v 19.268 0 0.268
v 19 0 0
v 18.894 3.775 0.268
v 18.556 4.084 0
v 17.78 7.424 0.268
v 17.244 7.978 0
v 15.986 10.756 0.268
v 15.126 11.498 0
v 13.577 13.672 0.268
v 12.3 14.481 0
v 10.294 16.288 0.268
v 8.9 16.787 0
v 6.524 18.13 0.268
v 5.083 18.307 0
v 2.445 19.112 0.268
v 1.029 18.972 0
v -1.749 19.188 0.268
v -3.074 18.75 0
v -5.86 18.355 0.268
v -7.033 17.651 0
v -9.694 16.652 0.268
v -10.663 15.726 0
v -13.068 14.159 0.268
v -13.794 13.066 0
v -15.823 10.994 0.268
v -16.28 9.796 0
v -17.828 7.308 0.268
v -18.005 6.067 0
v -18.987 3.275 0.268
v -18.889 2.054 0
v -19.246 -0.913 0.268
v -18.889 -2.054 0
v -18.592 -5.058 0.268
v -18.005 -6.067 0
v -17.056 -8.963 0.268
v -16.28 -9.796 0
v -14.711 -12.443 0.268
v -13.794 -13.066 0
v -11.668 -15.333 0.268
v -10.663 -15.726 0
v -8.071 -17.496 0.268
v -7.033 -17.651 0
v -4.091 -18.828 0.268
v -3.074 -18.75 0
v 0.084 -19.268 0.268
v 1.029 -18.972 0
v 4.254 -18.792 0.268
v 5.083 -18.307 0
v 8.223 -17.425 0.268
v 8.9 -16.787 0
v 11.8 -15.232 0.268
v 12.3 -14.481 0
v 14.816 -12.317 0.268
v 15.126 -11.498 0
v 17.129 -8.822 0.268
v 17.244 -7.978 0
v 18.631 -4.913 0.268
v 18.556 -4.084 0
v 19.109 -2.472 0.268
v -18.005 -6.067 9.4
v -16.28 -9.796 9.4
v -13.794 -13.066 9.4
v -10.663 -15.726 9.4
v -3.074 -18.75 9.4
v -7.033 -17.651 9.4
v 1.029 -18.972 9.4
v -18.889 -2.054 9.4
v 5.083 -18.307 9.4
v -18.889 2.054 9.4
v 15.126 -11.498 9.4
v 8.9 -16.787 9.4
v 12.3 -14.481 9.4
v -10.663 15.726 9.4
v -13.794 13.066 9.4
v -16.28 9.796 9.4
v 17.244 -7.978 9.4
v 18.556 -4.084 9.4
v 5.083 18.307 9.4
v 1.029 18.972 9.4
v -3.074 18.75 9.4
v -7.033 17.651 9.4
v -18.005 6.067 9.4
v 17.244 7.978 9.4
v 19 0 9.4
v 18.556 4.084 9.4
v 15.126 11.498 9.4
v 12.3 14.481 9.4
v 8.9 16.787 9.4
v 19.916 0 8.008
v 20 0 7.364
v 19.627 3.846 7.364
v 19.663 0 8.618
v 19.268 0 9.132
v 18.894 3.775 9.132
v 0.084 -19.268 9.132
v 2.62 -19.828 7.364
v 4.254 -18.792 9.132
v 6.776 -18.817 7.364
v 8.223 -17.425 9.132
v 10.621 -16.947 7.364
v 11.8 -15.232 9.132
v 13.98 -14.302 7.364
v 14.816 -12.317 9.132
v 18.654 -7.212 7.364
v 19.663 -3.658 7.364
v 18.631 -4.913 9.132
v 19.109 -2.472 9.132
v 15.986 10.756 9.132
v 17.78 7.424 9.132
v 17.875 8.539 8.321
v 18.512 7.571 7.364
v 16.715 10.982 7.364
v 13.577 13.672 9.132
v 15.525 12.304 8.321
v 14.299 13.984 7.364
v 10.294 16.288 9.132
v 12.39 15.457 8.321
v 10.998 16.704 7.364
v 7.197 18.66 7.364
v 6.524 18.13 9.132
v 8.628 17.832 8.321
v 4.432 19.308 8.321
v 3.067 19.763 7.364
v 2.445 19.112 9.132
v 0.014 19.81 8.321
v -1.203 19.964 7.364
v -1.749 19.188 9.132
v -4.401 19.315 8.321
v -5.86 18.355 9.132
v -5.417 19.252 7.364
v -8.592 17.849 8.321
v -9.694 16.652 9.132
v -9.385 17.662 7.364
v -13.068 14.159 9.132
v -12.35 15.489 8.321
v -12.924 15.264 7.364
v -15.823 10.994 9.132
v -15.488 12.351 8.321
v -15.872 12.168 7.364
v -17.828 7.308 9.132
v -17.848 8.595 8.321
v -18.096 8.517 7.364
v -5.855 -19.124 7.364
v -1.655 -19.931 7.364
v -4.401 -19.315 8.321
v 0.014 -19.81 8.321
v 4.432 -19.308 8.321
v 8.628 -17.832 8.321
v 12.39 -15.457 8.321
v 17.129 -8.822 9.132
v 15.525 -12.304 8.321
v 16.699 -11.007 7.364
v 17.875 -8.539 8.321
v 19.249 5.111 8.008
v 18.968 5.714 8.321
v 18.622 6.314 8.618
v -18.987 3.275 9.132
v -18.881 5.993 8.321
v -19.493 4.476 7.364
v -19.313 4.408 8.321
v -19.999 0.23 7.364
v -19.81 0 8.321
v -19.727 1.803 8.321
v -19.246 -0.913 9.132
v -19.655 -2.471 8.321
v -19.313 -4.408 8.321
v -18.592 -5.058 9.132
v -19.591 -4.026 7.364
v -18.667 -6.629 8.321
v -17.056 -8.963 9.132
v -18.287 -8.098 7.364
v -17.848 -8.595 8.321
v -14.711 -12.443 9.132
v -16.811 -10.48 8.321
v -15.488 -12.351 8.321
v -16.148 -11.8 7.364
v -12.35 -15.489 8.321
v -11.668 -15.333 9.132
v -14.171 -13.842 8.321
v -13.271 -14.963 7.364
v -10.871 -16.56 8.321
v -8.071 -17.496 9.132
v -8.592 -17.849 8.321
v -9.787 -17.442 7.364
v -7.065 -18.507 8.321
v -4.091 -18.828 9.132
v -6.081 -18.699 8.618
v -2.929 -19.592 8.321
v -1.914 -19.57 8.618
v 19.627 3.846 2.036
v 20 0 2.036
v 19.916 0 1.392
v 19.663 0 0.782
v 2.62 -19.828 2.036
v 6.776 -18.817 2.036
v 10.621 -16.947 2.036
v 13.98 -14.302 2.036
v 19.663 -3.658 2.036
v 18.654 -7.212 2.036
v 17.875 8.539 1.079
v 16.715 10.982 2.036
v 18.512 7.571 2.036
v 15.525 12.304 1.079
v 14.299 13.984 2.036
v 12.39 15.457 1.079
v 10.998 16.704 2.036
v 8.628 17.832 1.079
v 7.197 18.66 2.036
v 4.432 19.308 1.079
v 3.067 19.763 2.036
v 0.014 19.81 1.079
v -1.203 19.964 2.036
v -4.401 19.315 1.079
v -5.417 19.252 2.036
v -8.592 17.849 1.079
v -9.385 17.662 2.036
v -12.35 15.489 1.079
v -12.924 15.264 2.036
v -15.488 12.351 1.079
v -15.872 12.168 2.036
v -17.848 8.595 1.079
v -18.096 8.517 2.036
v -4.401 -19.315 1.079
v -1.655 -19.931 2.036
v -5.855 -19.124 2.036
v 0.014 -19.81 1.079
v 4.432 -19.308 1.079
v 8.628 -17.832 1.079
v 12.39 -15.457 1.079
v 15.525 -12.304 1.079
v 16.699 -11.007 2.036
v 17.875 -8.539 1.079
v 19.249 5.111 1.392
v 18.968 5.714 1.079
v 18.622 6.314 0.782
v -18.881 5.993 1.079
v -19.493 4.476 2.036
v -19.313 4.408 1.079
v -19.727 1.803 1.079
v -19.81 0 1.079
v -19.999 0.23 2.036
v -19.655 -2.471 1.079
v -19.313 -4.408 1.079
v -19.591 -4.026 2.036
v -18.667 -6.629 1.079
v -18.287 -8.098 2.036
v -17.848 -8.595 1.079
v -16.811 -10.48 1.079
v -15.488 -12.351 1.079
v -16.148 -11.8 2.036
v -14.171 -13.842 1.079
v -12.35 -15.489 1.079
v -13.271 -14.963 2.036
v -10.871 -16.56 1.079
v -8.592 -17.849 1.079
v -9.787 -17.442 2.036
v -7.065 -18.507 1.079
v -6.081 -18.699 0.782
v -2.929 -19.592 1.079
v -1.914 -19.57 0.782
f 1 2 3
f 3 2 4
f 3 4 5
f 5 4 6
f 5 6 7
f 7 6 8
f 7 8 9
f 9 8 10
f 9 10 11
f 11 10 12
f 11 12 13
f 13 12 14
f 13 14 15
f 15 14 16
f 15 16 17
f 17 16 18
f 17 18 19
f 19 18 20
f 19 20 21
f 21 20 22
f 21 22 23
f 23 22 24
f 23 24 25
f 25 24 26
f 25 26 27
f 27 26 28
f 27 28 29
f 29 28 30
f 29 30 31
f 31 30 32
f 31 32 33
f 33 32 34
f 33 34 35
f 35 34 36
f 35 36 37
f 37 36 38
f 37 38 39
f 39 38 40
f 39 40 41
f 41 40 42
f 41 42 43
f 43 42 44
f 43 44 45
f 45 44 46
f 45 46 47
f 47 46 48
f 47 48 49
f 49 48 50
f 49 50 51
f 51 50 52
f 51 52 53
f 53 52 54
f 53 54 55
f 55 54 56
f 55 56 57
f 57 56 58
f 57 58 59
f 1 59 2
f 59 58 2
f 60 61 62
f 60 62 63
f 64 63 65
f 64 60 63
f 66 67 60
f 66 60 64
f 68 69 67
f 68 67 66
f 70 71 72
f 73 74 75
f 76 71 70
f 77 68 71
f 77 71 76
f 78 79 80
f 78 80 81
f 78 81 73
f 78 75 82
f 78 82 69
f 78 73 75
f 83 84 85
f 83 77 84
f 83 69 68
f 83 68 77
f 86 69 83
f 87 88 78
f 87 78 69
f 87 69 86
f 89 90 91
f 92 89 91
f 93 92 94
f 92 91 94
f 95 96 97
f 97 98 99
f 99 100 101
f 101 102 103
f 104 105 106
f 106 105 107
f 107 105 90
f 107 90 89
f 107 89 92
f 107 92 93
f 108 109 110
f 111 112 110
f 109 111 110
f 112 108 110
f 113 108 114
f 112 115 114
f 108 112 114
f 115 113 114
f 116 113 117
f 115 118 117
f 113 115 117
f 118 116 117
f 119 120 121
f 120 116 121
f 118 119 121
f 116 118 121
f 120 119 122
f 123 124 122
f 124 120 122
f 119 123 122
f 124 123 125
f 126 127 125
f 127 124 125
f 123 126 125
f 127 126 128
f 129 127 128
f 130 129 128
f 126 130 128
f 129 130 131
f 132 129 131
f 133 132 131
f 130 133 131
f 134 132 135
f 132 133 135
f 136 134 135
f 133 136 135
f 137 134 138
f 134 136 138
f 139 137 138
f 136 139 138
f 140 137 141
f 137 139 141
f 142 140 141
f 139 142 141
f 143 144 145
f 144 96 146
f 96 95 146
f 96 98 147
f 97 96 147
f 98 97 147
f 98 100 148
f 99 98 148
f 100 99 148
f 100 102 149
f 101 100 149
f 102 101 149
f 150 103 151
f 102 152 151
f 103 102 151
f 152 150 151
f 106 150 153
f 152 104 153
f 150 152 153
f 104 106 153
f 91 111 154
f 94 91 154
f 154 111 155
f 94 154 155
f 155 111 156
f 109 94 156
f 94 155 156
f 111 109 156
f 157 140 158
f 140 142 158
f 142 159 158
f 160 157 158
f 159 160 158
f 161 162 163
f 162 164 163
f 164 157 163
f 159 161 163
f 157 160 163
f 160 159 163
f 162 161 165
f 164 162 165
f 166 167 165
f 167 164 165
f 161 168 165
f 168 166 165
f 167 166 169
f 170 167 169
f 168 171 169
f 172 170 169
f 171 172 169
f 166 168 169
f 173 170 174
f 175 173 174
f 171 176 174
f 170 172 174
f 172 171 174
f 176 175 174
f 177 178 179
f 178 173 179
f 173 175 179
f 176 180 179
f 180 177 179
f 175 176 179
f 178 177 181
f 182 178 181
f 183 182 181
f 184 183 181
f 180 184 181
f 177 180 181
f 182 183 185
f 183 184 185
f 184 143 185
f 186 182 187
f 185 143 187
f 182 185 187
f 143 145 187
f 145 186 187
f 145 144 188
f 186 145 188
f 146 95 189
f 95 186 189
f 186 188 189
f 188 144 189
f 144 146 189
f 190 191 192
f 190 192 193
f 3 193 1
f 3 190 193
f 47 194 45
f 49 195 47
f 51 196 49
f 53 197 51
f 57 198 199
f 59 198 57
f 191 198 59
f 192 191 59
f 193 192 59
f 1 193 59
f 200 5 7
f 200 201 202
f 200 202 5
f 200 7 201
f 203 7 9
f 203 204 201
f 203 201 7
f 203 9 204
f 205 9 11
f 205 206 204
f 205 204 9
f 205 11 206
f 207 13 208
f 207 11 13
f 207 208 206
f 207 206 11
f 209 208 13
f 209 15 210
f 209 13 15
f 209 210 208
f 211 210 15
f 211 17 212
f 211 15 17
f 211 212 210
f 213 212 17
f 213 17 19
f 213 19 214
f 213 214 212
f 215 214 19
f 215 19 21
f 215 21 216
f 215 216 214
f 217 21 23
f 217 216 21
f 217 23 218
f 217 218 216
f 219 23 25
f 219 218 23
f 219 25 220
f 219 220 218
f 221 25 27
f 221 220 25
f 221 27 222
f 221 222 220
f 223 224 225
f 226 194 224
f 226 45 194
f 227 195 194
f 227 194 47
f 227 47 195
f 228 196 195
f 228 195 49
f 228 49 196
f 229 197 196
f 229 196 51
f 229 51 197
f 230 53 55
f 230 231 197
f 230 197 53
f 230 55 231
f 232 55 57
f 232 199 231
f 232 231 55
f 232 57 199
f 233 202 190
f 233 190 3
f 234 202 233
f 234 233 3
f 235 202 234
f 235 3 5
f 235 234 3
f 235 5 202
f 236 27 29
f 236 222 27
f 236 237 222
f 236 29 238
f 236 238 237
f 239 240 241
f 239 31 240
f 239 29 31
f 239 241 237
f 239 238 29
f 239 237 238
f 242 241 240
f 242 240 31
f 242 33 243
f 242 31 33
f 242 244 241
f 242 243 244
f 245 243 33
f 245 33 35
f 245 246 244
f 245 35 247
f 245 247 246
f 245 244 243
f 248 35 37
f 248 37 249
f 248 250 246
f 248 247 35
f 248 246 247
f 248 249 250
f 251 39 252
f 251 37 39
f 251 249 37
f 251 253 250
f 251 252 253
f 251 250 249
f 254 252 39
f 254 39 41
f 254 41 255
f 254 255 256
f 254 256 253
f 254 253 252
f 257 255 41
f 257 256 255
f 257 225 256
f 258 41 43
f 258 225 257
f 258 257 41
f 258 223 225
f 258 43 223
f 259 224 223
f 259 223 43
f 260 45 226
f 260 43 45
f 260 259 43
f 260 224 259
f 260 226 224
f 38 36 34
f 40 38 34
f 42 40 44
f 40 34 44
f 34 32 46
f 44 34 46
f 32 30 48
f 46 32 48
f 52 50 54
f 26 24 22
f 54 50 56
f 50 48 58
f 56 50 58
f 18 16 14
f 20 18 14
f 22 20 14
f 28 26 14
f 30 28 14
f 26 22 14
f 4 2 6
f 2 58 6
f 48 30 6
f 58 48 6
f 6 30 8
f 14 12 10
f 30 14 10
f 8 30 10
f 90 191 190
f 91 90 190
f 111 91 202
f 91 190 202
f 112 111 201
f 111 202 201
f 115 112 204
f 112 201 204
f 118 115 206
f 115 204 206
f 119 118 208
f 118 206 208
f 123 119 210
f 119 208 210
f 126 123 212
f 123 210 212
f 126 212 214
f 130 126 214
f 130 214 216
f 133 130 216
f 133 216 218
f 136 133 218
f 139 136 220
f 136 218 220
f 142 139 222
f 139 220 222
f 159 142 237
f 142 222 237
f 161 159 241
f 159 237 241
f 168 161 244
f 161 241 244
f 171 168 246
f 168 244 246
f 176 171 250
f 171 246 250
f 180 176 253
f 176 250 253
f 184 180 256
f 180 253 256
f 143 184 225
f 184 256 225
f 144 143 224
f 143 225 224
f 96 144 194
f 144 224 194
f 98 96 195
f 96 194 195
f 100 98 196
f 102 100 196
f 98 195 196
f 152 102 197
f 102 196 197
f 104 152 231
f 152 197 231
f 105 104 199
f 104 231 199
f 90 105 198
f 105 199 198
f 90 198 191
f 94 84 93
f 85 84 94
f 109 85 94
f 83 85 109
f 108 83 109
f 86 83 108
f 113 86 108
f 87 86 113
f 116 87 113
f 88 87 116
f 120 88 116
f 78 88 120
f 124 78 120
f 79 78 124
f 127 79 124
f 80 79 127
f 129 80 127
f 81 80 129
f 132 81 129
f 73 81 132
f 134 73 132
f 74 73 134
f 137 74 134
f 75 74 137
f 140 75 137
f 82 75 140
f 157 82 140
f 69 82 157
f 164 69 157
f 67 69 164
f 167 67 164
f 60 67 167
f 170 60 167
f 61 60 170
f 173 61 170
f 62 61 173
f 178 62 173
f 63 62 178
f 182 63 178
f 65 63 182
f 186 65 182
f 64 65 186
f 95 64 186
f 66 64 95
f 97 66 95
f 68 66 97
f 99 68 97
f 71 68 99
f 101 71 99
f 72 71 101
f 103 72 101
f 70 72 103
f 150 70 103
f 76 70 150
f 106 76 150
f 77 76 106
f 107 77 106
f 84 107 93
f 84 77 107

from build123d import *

# Parameters (mm, degrees)
F0_R     = 20
F1_DEPTH = 9.4
F2_SIZE  = 1
F3_R     = 2.5


with BuildPart() as f1:
    # F0 (on Top) → F1 (new body)
    with BuildSketch(Plane.XY):
        Circle(F0_R)
    extrude(amount=F1_DEPTH)

    # F2
    f2_edges = [f1.edges().sort_by_distance(p)[0] for p in [
        (-20, 0, 9.4),
        (-20, 0, 0),
    ]]
    chamfer(f2_edges, length=F2_SIZE)

    # F3
    f3_edges = [f1.edges().sort_by_distance(p)[0] for p in [
        (-20, 0, 8.4),
        (-20, 0, 1),
    ]]
    fillet(f3_edges, radius=F3_R)


solid = f1.part
